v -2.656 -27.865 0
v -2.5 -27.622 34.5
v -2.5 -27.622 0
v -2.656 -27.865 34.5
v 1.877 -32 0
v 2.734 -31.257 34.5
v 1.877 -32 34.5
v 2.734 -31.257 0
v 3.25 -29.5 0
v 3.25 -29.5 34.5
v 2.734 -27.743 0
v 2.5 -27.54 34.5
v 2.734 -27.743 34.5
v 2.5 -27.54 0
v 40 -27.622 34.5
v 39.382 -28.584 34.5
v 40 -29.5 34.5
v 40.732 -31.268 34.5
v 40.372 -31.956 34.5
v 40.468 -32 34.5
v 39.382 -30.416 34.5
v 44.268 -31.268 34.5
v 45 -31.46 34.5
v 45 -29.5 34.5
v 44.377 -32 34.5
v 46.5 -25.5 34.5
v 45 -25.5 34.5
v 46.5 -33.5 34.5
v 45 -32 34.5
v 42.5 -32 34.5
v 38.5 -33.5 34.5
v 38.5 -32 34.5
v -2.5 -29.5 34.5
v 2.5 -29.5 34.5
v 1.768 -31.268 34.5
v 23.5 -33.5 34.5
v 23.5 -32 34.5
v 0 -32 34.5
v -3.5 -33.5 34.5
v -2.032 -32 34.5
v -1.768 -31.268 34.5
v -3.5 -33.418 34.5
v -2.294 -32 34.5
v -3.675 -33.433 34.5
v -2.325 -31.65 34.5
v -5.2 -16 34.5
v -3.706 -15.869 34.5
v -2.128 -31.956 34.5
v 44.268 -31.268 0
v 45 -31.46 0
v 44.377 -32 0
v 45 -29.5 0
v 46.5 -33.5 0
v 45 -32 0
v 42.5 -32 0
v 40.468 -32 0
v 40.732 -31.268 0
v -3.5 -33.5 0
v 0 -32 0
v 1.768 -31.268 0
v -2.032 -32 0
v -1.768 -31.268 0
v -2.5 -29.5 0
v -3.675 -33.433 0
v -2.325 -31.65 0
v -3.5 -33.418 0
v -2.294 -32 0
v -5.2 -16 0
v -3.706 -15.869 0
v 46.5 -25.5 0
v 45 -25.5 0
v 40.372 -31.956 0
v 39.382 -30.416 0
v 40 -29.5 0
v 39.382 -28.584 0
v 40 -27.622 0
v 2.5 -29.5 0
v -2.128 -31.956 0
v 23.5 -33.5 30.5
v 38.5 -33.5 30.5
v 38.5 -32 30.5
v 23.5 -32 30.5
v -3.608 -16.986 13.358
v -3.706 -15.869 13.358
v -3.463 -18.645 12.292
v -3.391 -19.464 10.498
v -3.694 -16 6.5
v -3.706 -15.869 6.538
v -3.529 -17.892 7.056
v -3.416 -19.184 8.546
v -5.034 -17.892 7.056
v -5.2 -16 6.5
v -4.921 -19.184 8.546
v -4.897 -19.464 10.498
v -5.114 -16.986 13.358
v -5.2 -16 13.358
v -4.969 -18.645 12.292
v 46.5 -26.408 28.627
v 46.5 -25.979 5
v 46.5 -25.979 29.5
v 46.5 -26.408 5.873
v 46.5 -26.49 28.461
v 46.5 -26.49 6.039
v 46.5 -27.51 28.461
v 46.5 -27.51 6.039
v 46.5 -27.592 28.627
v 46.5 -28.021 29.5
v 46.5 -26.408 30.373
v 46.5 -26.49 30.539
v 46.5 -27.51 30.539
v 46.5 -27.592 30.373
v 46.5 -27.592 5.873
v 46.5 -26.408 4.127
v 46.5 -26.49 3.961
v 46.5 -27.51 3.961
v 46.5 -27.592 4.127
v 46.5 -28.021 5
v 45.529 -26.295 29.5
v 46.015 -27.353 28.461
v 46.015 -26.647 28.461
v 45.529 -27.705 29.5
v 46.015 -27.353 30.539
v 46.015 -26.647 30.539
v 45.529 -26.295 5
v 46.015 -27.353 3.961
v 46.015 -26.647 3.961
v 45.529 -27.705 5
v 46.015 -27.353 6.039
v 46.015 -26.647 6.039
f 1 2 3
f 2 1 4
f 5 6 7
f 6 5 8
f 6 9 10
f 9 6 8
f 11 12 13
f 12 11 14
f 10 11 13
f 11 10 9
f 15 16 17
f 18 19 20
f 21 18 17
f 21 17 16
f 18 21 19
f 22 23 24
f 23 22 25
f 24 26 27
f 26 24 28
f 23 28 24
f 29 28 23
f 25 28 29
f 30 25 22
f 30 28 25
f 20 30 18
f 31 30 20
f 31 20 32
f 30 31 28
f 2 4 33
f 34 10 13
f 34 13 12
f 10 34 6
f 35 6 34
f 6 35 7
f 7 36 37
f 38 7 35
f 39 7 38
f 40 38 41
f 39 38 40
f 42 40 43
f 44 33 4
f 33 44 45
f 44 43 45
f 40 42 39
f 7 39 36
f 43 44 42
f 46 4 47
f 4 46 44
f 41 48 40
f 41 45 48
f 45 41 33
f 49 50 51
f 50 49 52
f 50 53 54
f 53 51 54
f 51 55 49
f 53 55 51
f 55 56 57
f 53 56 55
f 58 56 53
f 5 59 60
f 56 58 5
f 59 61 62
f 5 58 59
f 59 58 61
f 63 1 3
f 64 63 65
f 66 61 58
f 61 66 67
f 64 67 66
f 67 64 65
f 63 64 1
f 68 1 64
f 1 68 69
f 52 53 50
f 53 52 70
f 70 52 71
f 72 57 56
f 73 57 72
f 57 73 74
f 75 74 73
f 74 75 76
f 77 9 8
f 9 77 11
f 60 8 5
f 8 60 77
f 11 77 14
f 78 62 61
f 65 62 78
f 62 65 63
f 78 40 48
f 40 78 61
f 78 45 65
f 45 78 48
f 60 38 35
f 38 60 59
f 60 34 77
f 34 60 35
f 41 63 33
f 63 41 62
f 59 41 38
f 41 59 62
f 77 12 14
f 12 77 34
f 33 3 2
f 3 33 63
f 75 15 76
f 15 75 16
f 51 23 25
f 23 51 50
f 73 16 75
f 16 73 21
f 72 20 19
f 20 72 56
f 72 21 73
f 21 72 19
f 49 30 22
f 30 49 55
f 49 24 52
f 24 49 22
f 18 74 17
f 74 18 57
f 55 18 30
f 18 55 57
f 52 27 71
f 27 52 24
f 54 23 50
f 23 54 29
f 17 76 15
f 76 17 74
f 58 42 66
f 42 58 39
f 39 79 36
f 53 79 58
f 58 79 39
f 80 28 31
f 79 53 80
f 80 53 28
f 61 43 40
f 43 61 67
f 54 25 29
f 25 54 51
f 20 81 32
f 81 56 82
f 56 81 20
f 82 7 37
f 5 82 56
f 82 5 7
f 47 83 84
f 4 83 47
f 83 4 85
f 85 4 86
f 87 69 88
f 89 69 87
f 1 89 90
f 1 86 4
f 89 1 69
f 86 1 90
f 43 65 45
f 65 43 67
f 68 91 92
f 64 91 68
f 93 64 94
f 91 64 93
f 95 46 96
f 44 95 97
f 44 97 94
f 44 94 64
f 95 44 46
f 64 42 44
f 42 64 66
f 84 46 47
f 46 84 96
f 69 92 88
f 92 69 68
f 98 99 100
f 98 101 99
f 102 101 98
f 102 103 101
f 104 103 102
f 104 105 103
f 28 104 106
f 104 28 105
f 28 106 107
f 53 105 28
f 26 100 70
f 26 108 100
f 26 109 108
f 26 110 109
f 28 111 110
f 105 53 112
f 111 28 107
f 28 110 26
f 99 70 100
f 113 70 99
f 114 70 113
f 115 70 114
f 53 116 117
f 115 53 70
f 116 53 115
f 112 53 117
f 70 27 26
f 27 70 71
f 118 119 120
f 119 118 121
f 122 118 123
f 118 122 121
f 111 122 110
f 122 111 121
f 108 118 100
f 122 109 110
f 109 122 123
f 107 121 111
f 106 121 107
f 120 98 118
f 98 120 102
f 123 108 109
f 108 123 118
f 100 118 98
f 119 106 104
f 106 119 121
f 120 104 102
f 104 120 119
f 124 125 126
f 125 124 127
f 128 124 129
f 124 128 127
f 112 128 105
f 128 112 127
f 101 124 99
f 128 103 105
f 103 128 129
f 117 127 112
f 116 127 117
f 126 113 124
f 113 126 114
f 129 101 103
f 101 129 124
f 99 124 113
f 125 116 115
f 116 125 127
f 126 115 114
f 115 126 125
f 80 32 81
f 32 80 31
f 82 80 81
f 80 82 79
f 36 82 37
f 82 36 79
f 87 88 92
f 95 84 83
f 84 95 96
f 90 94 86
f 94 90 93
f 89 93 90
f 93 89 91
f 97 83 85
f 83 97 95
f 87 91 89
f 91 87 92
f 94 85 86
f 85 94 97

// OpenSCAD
echo(version=version());

font1 = "Liberation Sans";
font2 = "Segoe UI Emoji";

module letter(font, letter_size, letter_height, l) {
  linear_extrude(height = letter_height) {
    text(l, size = letter_size, font = font, halign = "center", valign = "center", $fn = 16);
  }
}

width=1.5;
z_h=34.5;
y_l=32;
part1_L=45.5;
part2_L=70;
part3_L=42.5;
spacer_diam=5;

module spacer() {
    difference() {
        cylinder(z_h,(spacer_diam + width)/2,(spacer_diam + width)/2,true);
        cylinder(z_h,spacer_diam/2,spacer_diam/2,true);
        translate([-spacer_diam/2,-spacer_diam,-z_h/2]) cube([spacer_diam, spacer_diam, z_h]);
    }
}

module side() {
    difference() {
        union() {
            //-- plates
            
            // back
            translate([0,-spacer_diam/2,z_h/2]) spacer();
            translate([+part3_L,-spacer_diam/2,z_h/2]) spacer();
            translate([-spacer_diam+width,0,0]) cube([part3_L+spacer_diam+width, width, z_h]);
            translate([-spacer_diam/2-spacer_diam/2-0.2,-y_l/2,0]) rotate([0,0,-5]) cube([width, y_l/2+width, z_h]);
            translate([part3_L+spacer_diam/2,-y_l/4+width,0]) cube([width, y_l/4, z_h]);
            /*            
            // front
            translate([+part3_L+part2_L,-spacer_diam/2,z_h/2]) spacer();
            translate([+part3_L+part2_L+part1_L,-spacer_diam/2,z_h/2]) spacer(); 
            translate([part2_L+part3_L,0,0]) cube([part1_L, width, z_h]);
            translate([part1_L+part2_L+part3_L+spacer_diam,-y_l/2+0.2,0]) rotate([0,0,+10]) cube([width, y_l/2, z_h*2/3]);
            translate([part2_L+part3_L-spacer_diam+width-0.2,-y_l/4,0]) cube([width, y_l/4, z_h]);
            
            // middle
            translate([part3_L+spacer_diam,-y_l/4,0]) cube([width, y_l/4, z_h]);
            translate([part3_L+spacer_diam,0,0]) rotate([0,0,-45]) cube([width, y_l/2, z_h]);
            translate([part2_L+part3_L-spacer_diam,-y_l/4,0]) cube([width, y_l/4, z_h]);
            translate([part2_L+part3_L-spacer_diam,0,0]) rotate([0,0,48]) cube([width, y_l/2, z_h]);
            translate([part3_L+16,10,0]) cube([part2_L-2*16, width, z_h]);
            */
        }
        
        // front
        translate([part2_L+part3_L-spacer_diam+1,-5,z_h-5]) sphere(r = 1.5);
        translate([part2_L+part3_L-spacer_diam+1,-5,5]) sphere(r = 1.5);
        translate([part1_L+part2_L+part3_L-41.6, -5,z_h-5]) cube([15, 10, 5]); // strap front
                
        // back
        translate([part3_L+spacer_diam-1,-5,z_h-5]) sphere(r = 1.2);
        translate([part3_L+spacer_diam-1,-5,5]) sphere(r = 1.2);
        translate([part3_L-19,-5,z_h-4]) cube([15, 10, 4]); // strap back
    }
}

// FULL set with mirror
difference() {
    union() {
        //side(); // left
        translate([0,-y_l,0]) mirror([0,1,0]) side(); // right
    }
    
    // back
    translate([0,-y_l/2,10]) rotate([0,90,0]) cylinder(z_h,3.5,3.5,true);
    
    // front
    translate([part1_L+part2_L+part3_L,-y_l/2,20]) rotate([0,90,0]) cylinder(z_h,y_l/2-spacer_diam/2,y_l/2-spacer_diam/2,true);
    
    // middle
    translate([part3_L+15/2,-y_l*2,0]) cube([part2_L-15, y_l*3, 10]);
}
